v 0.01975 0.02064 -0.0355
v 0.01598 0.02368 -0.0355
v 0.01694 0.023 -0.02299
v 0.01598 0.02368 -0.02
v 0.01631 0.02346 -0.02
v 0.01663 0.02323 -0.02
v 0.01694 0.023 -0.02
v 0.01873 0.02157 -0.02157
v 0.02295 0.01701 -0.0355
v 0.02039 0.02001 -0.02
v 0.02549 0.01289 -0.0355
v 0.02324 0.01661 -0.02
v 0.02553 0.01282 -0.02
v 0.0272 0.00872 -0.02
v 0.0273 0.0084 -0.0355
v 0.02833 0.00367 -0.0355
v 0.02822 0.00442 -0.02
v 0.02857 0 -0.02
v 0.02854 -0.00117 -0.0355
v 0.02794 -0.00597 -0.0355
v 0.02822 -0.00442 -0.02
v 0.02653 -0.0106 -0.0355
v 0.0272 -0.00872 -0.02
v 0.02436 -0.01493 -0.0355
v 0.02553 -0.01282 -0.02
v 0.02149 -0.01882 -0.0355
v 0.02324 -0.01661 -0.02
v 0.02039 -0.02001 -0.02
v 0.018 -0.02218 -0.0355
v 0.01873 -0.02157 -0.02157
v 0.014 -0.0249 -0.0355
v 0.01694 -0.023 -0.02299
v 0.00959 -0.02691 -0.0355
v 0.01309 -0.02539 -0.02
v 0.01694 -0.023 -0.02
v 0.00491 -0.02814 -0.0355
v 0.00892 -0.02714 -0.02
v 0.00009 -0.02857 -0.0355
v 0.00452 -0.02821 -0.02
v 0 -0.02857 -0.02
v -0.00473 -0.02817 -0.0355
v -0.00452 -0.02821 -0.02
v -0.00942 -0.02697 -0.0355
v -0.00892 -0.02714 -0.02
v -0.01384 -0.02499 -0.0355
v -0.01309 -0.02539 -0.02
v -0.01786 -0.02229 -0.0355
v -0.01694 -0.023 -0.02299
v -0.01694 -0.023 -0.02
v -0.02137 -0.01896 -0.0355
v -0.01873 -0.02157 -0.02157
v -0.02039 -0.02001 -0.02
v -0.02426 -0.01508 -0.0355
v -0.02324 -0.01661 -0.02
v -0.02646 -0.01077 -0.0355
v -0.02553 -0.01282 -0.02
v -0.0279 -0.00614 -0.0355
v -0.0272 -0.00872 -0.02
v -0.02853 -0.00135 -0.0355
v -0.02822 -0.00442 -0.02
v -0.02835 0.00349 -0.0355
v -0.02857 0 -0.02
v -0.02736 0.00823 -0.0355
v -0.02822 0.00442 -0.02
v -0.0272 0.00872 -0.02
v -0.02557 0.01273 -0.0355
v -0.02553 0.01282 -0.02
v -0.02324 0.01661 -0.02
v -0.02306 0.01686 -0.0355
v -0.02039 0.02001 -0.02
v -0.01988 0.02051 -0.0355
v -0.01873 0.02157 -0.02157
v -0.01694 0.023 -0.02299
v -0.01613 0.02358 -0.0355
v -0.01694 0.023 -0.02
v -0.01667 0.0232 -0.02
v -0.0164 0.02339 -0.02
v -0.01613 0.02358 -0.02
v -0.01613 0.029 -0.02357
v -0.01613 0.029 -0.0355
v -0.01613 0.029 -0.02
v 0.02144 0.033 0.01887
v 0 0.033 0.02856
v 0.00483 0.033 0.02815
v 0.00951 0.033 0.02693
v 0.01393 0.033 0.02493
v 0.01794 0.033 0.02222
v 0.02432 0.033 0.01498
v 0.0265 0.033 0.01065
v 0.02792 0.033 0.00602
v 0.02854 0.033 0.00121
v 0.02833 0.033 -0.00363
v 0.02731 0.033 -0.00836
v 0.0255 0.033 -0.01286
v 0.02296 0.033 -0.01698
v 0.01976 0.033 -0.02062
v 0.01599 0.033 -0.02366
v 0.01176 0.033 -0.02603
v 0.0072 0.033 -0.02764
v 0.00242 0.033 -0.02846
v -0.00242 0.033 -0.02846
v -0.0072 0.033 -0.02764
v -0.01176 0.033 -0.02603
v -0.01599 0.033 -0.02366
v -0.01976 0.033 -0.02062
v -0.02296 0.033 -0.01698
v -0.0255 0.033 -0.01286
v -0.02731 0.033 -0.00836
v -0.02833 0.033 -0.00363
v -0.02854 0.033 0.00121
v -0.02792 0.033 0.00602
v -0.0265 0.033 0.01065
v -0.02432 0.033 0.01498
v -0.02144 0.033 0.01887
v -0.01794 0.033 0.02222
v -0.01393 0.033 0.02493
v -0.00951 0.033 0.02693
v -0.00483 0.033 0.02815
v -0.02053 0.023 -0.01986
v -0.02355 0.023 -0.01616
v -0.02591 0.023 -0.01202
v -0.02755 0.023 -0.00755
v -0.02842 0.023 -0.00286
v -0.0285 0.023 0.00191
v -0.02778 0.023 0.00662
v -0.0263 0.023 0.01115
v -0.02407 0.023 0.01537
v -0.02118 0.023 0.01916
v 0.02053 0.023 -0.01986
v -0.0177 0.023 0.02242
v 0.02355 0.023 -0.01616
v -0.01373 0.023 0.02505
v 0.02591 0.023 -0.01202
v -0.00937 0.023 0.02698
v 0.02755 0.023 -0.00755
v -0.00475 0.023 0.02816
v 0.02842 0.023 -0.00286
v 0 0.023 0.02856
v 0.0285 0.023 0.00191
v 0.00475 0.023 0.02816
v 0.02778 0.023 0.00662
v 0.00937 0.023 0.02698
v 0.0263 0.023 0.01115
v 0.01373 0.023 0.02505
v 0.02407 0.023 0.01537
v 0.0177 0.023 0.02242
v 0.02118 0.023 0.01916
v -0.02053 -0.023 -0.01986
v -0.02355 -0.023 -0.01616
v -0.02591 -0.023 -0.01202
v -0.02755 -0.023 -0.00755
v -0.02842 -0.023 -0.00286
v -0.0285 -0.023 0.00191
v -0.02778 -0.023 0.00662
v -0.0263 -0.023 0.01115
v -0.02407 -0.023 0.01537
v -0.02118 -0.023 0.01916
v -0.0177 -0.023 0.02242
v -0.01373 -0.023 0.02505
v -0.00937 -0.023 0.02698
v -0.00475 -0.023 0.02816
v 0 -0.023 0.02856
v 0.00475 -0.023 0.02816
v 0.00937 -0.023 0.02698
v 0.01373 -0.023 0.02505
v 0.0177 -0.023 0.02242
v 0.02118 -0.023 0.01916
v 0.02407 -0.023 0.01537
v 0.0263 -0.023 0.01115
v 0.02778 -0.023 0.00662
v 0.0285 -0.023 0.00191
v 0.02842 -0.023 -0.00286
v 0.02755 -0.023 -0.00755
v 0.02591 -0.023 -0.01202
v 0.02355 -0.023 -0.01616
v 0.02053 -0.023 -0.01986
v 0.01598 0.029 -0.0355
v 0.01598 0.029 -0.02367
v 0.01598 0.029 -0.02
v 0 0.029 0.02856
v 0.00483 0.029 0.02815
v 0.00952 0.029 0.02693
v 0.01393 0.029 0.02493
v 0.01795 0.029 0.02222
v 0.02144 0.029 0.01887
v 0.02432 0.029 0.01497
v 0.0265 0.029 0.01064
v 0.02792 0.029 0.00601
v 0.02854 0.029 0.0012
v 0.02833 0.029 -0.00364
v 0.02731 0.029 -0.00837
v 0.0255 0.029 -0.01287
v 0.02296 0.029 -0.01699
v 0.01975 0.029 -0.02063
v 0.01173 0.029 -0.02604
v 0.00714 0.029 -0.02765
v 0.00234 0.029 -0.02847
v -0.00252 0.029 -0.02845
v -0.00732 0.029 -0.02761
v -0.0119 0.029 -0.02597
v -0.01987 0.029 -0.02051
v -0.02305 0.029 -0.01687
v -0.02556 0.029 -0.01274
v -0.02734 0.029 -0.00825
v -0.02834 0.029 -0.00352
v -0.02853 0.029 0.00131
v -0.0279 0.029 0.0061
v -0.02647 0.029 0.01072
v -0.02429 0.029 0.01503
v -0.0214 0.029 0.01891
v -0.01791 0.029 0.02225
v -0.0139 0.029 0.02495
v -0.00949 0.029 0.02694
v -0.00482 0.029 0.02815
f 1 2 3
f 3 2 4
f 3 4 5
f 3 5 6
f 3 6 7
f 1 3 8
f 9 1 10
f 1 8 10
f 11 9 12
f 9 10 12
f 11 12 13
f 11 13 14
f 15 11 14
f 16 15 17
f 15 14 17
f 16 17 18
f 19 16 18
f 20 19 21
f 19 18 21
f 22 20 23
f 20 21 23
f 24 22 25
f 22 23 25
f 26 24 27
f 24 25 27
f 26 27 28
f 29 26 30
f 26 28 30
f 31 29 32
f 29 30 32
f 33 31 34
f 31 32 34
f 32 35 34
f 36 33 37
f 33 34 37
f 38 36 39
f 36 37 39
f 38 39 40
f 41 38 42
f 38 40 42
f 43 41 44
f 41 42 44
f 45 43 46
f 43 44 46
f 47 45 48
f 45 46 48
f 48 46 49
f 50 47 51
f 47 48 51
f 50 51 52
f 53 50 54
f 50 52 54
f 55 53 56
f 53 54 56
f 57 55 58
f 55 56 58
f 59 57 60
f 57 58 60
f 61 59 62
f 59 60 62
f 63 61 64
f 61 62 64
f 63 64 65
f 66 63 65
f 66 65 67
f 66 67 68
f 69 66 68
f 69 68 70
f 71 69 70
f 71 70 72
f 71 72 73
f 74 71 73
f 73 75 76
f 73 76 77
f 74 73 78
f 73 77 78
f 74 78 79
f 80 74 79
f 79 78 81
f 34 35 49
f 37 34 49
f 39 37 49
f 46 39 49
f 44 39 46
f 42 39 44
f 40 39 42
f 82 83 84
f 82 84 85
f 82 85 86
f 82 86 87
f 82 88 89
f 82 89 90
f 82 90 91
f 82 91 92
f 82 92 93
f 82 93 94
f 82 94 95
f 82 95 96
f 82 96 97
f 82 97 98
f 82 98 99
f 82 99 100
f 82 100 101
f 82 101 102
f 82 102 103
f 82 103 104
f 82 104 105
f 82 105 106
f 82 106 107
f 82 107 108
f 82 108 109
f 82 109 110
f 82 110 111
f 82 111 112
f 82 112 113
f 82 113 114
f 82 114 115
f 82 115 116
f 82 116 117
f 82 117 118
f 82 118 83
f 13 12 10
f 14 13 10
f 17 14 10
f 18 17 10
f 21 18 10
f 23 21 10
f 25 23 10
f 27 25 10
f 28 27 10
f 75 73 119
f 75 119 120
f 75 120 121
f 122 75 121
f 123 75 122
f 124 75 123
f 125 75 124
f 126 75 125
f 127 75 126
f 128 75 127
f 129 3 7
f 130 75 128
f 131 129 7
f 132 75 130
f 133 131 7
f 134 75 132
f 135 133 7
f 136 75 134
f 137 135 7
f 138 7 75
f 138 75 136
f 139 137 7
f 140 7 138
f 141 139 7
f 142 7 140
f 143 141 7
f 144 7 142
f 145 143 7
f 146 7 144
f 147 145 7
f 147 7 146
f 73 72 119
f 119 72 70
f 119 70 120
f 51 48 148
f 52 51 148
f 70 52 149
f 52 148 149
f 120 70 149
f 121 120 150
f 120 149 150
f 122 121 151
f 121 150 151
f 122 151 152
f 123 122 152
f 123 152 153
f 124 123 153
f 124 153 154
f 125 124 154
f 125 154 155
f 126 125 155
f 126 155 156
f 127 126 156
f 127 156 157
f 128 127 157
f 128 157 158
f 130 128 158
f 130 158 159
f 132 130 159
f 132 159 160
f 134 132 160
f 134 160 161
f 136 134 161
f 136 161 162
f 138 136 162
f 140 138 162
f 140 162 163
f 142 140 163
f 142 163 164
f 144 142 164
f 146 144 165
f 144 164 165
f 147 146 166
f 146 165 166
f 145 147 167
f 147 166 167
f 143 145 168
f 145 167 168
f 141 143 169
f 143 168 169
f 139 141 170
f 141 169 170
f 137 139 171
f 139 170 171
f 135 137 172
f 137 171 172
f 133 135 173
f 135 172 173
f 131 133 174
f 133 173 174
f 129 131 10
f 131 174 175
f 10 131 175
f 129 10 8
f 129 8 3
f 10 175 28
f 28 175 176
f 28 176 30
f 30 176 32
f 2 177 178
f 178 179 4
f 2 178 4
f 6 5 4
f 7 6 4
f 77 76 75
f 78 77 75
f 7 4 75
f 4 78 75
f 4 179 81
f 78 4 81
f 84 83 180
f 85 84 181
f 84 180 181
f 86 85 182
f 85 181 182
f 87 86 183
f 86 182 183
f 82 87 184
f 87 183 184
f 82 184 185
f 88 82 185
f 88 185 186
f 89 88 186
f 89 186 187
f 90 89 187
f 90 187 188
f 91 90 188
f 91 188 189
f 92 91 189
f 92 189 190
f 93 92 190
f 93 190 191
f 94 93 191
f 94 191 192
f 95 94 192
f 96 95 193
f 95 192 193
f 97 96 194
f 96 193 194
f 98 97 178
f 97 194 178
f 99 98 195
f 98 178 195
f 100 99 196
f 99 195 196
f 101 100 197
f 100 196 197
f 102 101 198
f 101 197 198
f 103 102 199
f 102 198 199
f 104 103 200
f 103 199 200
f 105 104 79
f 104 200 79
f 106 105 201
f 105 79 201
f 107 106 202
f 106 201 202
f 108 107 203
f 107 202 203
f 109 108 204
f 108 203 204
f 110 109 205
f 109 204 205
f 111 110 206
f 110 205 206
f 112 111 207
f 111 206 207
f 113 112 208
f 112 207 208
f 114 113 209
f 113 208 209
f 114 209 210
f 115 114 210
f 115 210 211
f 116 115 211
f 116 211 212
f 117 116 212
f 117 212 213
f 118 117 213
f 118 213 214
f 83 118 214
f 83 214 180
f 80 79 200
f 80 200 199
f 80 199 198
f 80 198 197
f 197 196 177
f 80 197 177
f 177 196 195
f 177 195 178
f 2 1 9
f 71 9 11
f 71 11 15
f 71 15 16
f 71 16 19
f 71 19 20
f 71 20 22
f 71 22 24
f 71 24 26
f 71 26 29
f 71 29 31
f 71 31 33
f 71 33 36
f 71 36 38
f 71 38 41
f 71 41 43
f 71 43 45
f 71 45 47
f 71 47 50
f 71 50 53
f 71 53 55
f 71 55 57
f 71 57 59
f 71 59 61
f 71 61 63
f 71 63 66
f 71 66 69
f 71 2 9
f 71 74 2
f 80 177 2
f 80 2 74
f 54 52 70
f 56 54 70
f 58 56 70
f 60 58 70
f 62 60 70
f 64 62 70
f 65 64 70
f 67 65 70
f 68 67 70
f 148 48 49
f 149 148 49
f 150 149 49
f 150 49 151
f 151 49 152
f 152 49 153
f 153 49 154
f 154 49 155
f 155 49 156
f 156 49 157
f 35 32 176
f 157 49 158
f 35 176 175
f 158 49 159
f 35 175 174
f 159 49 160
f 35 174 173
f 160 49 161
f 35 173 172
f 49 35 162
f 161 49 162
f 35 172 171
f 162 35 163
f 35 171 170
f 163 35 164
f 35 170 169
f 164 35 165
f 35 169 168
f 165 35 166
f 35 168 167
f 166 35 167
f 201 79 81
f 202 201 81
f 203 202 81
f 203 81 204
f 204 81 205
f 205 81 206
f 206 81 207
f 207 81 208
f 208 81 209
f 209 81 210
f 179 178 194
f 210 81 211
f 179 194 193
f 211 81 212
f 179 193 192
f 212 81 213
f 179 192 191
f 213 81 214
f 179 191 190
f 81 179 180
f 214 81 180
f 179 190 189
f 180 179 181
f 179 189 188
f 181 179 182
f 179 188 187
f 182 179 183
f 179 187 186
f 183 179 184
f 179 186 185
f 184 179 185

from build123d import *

# Parameters (mm, degrees)
BOSS_EXTRUDE1_DEPTH      = 0.023
BOSS_EXTRUDE1_DEPTH_BACK = 0.023
SKETCH1_R                = 0.028561519
BOSS_EXTRUDE2_START      = 0.029
SKETCH1_2_R              = 0.028561519
BOSS_EXTRUDE2_DEPTH      = 0.004
BOSS_EXTRUDE3_START      = -0.02
BOSS_EXTRUDE3_DEPTH      = 0.0155


with BuildPart() as part:
    # Sketch1 → Boss-Extrude1 (new, two sides: drawn at the far end of the back side and taken through both)
    with BuildSketch(Plane(origin=(0, 0, 0), x_dir=(1, 0, 0), z_dir=(0, 1, 0)).offset(-BOSS_EXTRUDE1_DEPTH_BACK)):
        Circle(SKETCH1_R)
    extrude(amount=BOSS_EXTRUDE1_DEPTH + BOSS_EXTRUDE1_DEPTH_BACK)



with BuildPart() as body_2:
    # Sketch1<2> → Boss-Extrude2 (new body)
    with BuildSketch(Plane(origin=(0, 0, 0), x_dir=(1, 0, 0), z_dir=(0, 1, 0)).offset(BOSS_EXTRUDE2_START)):
        Circle(SKETCH1_2_R)
    extrude(amount=BOSS_EXTRUDE2_DEPTH)


with BuildPart() as part_1:
    add(part.part)

    add(body_2.part)  # Boss-Extrude3 merges body 2
    # Sketch2 → Boss-Extrude3 (add)
    with BuildSketch(Plane.XY.offset(BOSS_EXTRUDE3_START)):
        with BuildLine():
            Line((-0.016131092, 0.023575884), (-0.016131092, 0.029))
            Line((-0.016131092, 0.029), (0.015982454, 0.029))
            Line((0.015982454, 0.029), (0.015982454, 0.0236769))
            ThreePointArc((0.015982454, 0.0236769), (8.9858e-05, -0.028566175), (-0.016131092, 0.023575884))
        make_face()
    extrude(amount=-BOSS_EXTRUDE3_DEPTH)


solid = part_1.part
